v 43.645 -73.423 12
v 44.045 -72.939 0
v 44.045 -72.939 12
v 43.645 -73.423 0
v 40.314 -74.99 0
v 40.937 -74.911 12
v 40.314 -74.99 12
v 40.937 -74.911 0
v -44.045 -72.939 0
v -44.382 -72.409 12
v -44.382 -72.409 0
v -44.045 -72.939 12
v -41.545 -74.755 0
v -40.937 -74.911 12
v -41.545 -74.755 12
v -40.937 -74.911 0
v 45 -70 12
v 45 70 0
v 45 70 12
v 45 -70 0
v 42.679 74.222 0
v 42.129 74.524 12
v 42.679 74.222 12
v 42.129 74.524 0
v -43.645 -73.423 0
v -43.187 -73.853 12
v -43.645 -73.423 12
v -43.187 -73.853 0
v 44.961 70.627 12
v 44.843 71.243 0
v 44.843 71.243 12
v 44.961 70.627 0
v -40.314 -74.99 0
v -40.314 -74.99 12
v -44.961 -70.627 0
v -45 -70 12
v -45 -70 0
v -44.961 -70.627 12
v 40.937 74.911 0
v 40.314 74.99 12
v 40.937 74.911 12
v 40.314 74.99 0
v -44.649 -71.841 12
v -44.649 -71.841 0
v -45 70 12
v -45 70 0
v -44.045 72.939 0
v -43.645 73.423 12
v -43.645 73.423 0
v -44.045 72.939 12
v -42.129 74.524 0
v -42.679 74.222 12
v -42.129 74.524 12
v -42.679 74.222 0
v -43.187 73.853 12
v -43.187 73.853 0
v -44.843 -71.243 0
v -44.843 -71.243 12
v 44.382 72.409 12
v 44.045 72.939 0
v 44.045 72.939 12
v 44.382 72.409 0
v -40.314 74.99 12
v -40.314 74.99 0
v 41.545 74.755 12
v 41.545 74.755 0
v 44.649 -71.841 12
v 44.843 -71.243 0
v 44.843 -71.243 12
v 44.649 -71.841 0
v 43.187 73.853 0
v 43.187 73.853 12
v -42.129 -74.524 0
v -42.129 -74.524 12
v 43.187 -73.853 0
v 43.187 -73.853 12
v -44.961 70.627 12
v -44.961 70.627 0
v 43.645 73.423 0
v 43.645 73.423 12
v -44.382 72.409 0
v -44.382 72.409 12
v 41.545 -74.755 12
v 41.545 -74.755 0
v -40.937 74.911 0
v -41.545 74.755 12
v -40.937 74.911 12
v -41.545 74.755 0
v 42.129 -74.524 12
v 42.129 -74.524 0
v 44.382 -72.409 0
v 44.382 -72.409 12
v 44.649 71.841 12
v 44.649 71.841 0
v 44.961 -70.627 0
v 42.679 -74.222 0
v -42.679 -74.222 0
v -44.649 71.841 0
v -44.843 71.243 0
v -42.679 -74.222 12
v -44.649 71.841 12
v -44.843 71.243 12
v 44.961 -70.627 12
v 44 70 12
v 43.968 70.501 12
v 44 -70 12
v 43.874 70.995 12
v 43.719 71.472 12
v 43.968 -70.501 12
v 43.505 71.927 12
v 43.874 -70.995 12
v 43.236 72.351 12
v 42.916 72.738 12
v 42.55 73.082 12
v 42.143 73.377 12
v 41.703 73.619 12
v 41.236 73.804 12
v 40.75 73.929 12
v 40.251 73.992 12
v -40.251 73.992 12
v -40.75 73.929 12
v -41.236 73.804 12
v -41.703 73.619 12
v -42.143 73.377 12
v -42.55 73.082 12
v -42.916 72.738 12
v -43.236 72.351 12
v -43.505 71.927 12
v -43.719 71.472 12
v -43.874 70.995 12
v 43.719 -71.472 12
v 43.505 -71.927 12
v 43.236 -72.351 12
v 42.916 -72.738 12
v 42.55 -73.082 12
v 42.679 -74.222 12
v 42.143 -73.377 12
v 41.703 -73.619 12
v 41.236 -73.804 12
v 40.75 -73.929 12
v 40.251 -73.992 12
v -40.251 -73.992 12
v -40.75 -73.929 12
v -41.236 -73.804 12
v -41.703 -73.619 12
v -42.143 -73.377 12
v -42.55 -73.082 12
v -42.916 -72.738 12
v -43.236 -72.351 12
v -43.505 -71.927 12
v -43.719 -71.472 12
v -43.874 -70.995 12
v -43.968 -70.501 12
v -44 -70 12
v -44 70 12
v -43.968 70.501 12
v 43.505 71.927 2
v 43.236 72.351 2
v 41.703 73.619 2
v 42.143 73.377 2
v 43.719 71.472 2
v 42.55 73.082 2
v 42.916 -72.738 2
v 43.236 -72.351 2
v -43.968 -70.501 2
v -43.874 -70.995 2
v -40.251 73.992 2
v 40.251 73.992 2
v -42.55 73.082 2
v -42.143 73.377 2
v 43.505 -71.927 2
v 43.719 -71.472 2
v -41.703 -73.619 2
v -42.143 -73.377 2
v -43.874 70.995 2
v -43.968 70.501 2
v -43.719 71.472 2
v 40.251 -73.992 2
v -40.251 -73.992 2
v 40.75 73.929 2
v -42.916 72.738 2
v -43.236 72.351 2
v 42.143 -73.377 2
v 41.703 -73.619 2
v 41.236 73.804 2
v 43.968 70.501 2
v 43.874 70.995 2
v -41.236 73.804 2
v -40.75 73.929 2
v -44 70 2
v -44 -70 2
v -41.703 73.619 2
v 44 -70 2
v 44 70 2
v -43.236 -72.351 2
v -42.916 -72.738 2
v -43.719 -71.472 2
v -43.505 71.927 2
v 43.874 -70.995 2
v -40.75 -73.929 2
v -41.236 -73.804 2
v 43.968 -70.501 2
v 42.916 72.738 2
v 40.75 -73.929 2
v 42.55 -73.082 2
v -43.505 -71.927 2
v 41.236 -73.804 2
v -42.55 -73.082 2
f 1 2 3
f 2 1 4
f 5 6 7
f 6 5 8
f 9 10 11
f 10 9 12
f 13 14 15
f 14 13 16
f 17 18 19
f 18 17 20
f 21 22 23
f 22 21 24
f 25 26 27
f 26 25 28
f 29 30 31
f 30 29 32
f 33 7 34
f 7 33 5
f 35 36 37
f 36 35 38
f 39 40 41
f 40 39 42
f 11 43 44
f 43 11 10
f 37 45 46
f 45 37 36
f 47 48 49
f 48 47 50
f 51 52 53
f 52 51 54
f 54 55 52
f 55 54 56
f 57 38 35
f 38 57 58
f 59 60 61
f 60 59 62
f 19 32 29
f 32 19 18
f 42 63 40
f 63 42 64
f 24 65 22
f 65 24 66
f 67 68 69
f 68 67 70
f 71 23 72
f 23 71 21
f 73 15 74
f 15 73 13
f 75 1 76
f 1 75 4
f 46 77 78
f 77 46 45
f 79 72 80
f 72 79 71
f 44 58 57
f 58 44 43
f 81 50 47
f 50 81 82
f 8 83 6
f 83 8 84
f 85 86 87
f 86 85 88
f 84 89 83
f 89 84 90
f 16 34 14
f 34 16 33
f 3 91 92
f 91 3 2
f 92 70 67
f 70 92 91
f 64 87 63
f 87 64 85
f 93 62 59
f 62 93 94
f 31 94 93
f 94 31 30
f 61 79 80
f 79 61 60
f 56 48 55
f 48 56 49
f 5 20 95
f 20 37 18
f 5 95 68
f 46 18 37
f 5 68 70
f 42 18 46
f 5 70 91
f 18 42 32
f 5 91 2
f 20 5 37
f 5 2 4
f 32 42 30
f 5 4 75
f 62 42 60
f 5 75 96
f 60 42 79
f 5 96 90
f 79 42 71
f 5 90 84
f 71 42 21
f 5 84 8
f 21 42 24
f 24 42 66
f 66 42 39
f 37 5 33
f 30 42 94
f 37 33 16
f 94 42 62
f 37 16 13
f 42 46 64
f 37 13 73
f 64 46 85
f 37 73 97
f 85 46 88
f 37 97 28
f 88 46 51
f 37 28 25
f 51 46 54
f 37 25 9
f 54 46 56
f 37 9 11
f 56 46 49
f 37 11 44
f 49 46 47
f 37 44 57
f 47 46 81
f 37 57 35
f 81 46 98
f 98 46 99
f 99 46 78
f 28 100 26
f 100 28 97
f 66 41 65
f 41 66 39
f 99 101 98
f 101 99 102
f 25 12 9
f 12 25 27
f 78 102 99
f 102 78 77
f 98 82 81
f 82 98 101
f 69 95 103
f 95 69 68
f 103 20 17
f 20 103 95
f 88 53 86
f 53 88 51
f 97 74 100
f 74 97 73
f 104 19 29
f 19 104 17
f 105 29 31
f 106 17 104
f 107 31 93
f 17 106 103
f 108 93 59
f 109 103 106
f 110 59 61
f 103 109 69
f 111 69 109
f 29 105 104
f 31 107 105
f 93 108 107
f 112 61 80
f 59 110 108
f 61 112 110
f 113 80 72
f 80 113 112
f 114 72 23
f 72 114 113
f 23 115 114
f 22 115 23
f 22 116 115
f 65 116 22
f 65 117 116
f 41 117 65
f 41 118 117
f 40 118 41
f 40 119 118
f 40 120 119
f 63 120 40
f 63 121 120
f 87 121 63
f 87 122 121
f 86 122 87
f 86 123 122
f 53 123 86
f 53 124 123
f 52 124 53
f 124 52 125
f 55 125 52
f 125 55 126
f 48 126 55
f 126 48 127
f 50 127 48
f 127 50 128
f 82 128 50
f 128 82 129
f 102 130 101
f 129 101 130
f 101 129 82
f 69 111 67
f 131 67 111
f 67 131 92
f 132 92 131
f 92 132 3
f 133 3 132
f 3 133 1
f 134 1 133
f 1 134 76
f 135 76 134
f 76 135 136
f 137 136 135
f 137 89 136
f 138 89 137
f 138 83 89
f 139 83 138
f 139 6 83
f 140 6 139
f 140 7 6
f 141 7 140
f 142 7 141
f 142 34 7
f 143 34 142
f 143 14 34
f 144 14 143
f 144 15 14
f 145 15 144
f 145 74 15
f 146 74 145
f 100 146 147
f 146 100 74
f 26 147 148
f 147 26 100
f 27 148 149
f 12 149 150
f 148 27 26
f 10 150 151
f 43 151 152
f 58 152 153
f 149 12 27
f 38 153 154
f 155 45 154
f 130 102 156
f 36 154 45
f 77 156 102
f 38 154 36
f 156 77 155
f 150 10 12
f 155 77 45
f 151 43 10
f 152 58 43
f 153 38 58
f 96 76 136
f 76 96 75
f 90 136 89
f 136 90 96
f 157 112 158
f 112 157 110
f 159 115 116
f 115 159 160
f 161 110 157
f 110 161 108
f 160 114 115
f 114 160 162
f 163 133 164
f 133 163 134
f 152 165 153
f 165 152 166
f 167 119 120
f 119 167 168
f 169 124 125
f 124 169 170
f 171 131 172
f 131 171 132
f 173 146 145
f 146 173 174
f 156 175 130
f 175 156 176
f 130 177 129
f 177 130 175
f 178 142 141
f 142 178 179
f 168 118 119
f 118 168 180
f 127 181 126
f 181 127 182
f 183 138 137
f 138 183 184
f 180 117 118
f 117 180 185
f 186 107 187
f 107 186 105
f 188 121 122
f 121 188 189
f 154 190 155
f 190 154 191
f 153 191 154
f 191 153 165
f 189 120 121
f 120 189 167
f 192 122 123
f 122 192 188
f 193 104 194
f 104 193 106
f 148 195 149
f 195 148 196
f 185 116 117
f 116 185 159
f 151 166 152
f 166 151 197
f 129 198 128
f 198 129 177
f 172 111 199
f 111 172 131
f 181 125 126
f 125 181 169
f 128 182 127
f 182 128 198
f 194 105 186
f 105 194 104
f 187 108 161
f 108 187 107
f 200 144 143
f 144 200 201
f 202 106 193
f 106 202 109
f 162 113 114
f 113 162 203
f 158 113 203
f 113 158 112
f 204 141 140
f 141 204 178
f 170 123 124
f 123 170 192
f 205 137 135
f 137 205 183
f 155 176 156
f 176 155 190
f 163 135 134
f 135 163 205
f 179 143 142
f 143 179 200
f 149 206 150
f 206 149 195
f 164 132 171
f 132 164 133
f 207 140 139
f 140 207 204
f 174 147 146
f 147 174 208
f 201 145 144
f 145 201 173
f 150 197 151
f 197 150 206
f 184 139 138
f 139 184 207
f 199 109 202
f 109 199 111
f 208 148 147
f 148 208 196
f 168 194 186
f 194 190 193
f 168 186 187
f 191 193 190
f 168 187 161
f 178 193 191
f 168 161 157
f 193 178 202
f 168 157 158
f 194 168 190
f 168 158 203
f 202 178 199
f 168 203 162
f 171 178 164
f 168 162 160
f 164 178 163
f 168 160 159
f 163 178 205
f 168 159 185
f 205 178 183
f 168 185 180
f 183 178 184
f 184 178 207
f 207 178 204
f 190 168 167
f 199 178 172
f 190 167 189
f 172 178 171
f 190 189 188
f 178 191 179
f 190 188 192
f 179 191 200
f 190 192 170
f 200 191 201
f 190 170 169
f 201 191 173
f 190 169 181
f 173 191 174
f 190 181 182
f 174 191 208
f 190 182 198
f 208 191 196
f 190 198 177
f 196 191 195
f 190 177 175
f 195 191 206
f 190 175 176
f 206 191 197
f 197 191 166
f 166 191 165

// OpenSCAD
$fn = 50;


difference() {
	union() {
		hull() {
			translate(v = [-40.0000000000, 70.0000000000, 0]) {
				cylinder(h = 12, r = 5);
			}
			translate(v = [40.0000000000, 70.0000000000, 0]) {
				cylinder(h = 12, r = 5);
			}
			translate(v = [-40.0000000000, -70.0000000000, 0]) {
				cylinder(h = 12, r = 5);
			}
			translate(v = [40.0000000000, -70.0000000000, 0]) {
				cylinder(h = 12, r = 5);
			}
		}
	}
	union() {
		translate(v = [0, 0, 2]) {
			hull() {
				translate(v = [-40.0000000000, 70.0000000000, 0]) {
					cylinder(h = 10, r = 4);
				}
				translate(v = [40.0000000000, 70.0000000000, 0]) {
					cylinder(h = 10, r = 4);
				}
				translate(v = [-40.0000000000, -70.0000000000, 0]) {
					cylinder(h = 10, r = 4);
				}
				translate(v = [40.0000000000, -70.0000000000, 0]) {
					cylinder(h = 10, r = 4);
				}
			}
		}
	}
}
